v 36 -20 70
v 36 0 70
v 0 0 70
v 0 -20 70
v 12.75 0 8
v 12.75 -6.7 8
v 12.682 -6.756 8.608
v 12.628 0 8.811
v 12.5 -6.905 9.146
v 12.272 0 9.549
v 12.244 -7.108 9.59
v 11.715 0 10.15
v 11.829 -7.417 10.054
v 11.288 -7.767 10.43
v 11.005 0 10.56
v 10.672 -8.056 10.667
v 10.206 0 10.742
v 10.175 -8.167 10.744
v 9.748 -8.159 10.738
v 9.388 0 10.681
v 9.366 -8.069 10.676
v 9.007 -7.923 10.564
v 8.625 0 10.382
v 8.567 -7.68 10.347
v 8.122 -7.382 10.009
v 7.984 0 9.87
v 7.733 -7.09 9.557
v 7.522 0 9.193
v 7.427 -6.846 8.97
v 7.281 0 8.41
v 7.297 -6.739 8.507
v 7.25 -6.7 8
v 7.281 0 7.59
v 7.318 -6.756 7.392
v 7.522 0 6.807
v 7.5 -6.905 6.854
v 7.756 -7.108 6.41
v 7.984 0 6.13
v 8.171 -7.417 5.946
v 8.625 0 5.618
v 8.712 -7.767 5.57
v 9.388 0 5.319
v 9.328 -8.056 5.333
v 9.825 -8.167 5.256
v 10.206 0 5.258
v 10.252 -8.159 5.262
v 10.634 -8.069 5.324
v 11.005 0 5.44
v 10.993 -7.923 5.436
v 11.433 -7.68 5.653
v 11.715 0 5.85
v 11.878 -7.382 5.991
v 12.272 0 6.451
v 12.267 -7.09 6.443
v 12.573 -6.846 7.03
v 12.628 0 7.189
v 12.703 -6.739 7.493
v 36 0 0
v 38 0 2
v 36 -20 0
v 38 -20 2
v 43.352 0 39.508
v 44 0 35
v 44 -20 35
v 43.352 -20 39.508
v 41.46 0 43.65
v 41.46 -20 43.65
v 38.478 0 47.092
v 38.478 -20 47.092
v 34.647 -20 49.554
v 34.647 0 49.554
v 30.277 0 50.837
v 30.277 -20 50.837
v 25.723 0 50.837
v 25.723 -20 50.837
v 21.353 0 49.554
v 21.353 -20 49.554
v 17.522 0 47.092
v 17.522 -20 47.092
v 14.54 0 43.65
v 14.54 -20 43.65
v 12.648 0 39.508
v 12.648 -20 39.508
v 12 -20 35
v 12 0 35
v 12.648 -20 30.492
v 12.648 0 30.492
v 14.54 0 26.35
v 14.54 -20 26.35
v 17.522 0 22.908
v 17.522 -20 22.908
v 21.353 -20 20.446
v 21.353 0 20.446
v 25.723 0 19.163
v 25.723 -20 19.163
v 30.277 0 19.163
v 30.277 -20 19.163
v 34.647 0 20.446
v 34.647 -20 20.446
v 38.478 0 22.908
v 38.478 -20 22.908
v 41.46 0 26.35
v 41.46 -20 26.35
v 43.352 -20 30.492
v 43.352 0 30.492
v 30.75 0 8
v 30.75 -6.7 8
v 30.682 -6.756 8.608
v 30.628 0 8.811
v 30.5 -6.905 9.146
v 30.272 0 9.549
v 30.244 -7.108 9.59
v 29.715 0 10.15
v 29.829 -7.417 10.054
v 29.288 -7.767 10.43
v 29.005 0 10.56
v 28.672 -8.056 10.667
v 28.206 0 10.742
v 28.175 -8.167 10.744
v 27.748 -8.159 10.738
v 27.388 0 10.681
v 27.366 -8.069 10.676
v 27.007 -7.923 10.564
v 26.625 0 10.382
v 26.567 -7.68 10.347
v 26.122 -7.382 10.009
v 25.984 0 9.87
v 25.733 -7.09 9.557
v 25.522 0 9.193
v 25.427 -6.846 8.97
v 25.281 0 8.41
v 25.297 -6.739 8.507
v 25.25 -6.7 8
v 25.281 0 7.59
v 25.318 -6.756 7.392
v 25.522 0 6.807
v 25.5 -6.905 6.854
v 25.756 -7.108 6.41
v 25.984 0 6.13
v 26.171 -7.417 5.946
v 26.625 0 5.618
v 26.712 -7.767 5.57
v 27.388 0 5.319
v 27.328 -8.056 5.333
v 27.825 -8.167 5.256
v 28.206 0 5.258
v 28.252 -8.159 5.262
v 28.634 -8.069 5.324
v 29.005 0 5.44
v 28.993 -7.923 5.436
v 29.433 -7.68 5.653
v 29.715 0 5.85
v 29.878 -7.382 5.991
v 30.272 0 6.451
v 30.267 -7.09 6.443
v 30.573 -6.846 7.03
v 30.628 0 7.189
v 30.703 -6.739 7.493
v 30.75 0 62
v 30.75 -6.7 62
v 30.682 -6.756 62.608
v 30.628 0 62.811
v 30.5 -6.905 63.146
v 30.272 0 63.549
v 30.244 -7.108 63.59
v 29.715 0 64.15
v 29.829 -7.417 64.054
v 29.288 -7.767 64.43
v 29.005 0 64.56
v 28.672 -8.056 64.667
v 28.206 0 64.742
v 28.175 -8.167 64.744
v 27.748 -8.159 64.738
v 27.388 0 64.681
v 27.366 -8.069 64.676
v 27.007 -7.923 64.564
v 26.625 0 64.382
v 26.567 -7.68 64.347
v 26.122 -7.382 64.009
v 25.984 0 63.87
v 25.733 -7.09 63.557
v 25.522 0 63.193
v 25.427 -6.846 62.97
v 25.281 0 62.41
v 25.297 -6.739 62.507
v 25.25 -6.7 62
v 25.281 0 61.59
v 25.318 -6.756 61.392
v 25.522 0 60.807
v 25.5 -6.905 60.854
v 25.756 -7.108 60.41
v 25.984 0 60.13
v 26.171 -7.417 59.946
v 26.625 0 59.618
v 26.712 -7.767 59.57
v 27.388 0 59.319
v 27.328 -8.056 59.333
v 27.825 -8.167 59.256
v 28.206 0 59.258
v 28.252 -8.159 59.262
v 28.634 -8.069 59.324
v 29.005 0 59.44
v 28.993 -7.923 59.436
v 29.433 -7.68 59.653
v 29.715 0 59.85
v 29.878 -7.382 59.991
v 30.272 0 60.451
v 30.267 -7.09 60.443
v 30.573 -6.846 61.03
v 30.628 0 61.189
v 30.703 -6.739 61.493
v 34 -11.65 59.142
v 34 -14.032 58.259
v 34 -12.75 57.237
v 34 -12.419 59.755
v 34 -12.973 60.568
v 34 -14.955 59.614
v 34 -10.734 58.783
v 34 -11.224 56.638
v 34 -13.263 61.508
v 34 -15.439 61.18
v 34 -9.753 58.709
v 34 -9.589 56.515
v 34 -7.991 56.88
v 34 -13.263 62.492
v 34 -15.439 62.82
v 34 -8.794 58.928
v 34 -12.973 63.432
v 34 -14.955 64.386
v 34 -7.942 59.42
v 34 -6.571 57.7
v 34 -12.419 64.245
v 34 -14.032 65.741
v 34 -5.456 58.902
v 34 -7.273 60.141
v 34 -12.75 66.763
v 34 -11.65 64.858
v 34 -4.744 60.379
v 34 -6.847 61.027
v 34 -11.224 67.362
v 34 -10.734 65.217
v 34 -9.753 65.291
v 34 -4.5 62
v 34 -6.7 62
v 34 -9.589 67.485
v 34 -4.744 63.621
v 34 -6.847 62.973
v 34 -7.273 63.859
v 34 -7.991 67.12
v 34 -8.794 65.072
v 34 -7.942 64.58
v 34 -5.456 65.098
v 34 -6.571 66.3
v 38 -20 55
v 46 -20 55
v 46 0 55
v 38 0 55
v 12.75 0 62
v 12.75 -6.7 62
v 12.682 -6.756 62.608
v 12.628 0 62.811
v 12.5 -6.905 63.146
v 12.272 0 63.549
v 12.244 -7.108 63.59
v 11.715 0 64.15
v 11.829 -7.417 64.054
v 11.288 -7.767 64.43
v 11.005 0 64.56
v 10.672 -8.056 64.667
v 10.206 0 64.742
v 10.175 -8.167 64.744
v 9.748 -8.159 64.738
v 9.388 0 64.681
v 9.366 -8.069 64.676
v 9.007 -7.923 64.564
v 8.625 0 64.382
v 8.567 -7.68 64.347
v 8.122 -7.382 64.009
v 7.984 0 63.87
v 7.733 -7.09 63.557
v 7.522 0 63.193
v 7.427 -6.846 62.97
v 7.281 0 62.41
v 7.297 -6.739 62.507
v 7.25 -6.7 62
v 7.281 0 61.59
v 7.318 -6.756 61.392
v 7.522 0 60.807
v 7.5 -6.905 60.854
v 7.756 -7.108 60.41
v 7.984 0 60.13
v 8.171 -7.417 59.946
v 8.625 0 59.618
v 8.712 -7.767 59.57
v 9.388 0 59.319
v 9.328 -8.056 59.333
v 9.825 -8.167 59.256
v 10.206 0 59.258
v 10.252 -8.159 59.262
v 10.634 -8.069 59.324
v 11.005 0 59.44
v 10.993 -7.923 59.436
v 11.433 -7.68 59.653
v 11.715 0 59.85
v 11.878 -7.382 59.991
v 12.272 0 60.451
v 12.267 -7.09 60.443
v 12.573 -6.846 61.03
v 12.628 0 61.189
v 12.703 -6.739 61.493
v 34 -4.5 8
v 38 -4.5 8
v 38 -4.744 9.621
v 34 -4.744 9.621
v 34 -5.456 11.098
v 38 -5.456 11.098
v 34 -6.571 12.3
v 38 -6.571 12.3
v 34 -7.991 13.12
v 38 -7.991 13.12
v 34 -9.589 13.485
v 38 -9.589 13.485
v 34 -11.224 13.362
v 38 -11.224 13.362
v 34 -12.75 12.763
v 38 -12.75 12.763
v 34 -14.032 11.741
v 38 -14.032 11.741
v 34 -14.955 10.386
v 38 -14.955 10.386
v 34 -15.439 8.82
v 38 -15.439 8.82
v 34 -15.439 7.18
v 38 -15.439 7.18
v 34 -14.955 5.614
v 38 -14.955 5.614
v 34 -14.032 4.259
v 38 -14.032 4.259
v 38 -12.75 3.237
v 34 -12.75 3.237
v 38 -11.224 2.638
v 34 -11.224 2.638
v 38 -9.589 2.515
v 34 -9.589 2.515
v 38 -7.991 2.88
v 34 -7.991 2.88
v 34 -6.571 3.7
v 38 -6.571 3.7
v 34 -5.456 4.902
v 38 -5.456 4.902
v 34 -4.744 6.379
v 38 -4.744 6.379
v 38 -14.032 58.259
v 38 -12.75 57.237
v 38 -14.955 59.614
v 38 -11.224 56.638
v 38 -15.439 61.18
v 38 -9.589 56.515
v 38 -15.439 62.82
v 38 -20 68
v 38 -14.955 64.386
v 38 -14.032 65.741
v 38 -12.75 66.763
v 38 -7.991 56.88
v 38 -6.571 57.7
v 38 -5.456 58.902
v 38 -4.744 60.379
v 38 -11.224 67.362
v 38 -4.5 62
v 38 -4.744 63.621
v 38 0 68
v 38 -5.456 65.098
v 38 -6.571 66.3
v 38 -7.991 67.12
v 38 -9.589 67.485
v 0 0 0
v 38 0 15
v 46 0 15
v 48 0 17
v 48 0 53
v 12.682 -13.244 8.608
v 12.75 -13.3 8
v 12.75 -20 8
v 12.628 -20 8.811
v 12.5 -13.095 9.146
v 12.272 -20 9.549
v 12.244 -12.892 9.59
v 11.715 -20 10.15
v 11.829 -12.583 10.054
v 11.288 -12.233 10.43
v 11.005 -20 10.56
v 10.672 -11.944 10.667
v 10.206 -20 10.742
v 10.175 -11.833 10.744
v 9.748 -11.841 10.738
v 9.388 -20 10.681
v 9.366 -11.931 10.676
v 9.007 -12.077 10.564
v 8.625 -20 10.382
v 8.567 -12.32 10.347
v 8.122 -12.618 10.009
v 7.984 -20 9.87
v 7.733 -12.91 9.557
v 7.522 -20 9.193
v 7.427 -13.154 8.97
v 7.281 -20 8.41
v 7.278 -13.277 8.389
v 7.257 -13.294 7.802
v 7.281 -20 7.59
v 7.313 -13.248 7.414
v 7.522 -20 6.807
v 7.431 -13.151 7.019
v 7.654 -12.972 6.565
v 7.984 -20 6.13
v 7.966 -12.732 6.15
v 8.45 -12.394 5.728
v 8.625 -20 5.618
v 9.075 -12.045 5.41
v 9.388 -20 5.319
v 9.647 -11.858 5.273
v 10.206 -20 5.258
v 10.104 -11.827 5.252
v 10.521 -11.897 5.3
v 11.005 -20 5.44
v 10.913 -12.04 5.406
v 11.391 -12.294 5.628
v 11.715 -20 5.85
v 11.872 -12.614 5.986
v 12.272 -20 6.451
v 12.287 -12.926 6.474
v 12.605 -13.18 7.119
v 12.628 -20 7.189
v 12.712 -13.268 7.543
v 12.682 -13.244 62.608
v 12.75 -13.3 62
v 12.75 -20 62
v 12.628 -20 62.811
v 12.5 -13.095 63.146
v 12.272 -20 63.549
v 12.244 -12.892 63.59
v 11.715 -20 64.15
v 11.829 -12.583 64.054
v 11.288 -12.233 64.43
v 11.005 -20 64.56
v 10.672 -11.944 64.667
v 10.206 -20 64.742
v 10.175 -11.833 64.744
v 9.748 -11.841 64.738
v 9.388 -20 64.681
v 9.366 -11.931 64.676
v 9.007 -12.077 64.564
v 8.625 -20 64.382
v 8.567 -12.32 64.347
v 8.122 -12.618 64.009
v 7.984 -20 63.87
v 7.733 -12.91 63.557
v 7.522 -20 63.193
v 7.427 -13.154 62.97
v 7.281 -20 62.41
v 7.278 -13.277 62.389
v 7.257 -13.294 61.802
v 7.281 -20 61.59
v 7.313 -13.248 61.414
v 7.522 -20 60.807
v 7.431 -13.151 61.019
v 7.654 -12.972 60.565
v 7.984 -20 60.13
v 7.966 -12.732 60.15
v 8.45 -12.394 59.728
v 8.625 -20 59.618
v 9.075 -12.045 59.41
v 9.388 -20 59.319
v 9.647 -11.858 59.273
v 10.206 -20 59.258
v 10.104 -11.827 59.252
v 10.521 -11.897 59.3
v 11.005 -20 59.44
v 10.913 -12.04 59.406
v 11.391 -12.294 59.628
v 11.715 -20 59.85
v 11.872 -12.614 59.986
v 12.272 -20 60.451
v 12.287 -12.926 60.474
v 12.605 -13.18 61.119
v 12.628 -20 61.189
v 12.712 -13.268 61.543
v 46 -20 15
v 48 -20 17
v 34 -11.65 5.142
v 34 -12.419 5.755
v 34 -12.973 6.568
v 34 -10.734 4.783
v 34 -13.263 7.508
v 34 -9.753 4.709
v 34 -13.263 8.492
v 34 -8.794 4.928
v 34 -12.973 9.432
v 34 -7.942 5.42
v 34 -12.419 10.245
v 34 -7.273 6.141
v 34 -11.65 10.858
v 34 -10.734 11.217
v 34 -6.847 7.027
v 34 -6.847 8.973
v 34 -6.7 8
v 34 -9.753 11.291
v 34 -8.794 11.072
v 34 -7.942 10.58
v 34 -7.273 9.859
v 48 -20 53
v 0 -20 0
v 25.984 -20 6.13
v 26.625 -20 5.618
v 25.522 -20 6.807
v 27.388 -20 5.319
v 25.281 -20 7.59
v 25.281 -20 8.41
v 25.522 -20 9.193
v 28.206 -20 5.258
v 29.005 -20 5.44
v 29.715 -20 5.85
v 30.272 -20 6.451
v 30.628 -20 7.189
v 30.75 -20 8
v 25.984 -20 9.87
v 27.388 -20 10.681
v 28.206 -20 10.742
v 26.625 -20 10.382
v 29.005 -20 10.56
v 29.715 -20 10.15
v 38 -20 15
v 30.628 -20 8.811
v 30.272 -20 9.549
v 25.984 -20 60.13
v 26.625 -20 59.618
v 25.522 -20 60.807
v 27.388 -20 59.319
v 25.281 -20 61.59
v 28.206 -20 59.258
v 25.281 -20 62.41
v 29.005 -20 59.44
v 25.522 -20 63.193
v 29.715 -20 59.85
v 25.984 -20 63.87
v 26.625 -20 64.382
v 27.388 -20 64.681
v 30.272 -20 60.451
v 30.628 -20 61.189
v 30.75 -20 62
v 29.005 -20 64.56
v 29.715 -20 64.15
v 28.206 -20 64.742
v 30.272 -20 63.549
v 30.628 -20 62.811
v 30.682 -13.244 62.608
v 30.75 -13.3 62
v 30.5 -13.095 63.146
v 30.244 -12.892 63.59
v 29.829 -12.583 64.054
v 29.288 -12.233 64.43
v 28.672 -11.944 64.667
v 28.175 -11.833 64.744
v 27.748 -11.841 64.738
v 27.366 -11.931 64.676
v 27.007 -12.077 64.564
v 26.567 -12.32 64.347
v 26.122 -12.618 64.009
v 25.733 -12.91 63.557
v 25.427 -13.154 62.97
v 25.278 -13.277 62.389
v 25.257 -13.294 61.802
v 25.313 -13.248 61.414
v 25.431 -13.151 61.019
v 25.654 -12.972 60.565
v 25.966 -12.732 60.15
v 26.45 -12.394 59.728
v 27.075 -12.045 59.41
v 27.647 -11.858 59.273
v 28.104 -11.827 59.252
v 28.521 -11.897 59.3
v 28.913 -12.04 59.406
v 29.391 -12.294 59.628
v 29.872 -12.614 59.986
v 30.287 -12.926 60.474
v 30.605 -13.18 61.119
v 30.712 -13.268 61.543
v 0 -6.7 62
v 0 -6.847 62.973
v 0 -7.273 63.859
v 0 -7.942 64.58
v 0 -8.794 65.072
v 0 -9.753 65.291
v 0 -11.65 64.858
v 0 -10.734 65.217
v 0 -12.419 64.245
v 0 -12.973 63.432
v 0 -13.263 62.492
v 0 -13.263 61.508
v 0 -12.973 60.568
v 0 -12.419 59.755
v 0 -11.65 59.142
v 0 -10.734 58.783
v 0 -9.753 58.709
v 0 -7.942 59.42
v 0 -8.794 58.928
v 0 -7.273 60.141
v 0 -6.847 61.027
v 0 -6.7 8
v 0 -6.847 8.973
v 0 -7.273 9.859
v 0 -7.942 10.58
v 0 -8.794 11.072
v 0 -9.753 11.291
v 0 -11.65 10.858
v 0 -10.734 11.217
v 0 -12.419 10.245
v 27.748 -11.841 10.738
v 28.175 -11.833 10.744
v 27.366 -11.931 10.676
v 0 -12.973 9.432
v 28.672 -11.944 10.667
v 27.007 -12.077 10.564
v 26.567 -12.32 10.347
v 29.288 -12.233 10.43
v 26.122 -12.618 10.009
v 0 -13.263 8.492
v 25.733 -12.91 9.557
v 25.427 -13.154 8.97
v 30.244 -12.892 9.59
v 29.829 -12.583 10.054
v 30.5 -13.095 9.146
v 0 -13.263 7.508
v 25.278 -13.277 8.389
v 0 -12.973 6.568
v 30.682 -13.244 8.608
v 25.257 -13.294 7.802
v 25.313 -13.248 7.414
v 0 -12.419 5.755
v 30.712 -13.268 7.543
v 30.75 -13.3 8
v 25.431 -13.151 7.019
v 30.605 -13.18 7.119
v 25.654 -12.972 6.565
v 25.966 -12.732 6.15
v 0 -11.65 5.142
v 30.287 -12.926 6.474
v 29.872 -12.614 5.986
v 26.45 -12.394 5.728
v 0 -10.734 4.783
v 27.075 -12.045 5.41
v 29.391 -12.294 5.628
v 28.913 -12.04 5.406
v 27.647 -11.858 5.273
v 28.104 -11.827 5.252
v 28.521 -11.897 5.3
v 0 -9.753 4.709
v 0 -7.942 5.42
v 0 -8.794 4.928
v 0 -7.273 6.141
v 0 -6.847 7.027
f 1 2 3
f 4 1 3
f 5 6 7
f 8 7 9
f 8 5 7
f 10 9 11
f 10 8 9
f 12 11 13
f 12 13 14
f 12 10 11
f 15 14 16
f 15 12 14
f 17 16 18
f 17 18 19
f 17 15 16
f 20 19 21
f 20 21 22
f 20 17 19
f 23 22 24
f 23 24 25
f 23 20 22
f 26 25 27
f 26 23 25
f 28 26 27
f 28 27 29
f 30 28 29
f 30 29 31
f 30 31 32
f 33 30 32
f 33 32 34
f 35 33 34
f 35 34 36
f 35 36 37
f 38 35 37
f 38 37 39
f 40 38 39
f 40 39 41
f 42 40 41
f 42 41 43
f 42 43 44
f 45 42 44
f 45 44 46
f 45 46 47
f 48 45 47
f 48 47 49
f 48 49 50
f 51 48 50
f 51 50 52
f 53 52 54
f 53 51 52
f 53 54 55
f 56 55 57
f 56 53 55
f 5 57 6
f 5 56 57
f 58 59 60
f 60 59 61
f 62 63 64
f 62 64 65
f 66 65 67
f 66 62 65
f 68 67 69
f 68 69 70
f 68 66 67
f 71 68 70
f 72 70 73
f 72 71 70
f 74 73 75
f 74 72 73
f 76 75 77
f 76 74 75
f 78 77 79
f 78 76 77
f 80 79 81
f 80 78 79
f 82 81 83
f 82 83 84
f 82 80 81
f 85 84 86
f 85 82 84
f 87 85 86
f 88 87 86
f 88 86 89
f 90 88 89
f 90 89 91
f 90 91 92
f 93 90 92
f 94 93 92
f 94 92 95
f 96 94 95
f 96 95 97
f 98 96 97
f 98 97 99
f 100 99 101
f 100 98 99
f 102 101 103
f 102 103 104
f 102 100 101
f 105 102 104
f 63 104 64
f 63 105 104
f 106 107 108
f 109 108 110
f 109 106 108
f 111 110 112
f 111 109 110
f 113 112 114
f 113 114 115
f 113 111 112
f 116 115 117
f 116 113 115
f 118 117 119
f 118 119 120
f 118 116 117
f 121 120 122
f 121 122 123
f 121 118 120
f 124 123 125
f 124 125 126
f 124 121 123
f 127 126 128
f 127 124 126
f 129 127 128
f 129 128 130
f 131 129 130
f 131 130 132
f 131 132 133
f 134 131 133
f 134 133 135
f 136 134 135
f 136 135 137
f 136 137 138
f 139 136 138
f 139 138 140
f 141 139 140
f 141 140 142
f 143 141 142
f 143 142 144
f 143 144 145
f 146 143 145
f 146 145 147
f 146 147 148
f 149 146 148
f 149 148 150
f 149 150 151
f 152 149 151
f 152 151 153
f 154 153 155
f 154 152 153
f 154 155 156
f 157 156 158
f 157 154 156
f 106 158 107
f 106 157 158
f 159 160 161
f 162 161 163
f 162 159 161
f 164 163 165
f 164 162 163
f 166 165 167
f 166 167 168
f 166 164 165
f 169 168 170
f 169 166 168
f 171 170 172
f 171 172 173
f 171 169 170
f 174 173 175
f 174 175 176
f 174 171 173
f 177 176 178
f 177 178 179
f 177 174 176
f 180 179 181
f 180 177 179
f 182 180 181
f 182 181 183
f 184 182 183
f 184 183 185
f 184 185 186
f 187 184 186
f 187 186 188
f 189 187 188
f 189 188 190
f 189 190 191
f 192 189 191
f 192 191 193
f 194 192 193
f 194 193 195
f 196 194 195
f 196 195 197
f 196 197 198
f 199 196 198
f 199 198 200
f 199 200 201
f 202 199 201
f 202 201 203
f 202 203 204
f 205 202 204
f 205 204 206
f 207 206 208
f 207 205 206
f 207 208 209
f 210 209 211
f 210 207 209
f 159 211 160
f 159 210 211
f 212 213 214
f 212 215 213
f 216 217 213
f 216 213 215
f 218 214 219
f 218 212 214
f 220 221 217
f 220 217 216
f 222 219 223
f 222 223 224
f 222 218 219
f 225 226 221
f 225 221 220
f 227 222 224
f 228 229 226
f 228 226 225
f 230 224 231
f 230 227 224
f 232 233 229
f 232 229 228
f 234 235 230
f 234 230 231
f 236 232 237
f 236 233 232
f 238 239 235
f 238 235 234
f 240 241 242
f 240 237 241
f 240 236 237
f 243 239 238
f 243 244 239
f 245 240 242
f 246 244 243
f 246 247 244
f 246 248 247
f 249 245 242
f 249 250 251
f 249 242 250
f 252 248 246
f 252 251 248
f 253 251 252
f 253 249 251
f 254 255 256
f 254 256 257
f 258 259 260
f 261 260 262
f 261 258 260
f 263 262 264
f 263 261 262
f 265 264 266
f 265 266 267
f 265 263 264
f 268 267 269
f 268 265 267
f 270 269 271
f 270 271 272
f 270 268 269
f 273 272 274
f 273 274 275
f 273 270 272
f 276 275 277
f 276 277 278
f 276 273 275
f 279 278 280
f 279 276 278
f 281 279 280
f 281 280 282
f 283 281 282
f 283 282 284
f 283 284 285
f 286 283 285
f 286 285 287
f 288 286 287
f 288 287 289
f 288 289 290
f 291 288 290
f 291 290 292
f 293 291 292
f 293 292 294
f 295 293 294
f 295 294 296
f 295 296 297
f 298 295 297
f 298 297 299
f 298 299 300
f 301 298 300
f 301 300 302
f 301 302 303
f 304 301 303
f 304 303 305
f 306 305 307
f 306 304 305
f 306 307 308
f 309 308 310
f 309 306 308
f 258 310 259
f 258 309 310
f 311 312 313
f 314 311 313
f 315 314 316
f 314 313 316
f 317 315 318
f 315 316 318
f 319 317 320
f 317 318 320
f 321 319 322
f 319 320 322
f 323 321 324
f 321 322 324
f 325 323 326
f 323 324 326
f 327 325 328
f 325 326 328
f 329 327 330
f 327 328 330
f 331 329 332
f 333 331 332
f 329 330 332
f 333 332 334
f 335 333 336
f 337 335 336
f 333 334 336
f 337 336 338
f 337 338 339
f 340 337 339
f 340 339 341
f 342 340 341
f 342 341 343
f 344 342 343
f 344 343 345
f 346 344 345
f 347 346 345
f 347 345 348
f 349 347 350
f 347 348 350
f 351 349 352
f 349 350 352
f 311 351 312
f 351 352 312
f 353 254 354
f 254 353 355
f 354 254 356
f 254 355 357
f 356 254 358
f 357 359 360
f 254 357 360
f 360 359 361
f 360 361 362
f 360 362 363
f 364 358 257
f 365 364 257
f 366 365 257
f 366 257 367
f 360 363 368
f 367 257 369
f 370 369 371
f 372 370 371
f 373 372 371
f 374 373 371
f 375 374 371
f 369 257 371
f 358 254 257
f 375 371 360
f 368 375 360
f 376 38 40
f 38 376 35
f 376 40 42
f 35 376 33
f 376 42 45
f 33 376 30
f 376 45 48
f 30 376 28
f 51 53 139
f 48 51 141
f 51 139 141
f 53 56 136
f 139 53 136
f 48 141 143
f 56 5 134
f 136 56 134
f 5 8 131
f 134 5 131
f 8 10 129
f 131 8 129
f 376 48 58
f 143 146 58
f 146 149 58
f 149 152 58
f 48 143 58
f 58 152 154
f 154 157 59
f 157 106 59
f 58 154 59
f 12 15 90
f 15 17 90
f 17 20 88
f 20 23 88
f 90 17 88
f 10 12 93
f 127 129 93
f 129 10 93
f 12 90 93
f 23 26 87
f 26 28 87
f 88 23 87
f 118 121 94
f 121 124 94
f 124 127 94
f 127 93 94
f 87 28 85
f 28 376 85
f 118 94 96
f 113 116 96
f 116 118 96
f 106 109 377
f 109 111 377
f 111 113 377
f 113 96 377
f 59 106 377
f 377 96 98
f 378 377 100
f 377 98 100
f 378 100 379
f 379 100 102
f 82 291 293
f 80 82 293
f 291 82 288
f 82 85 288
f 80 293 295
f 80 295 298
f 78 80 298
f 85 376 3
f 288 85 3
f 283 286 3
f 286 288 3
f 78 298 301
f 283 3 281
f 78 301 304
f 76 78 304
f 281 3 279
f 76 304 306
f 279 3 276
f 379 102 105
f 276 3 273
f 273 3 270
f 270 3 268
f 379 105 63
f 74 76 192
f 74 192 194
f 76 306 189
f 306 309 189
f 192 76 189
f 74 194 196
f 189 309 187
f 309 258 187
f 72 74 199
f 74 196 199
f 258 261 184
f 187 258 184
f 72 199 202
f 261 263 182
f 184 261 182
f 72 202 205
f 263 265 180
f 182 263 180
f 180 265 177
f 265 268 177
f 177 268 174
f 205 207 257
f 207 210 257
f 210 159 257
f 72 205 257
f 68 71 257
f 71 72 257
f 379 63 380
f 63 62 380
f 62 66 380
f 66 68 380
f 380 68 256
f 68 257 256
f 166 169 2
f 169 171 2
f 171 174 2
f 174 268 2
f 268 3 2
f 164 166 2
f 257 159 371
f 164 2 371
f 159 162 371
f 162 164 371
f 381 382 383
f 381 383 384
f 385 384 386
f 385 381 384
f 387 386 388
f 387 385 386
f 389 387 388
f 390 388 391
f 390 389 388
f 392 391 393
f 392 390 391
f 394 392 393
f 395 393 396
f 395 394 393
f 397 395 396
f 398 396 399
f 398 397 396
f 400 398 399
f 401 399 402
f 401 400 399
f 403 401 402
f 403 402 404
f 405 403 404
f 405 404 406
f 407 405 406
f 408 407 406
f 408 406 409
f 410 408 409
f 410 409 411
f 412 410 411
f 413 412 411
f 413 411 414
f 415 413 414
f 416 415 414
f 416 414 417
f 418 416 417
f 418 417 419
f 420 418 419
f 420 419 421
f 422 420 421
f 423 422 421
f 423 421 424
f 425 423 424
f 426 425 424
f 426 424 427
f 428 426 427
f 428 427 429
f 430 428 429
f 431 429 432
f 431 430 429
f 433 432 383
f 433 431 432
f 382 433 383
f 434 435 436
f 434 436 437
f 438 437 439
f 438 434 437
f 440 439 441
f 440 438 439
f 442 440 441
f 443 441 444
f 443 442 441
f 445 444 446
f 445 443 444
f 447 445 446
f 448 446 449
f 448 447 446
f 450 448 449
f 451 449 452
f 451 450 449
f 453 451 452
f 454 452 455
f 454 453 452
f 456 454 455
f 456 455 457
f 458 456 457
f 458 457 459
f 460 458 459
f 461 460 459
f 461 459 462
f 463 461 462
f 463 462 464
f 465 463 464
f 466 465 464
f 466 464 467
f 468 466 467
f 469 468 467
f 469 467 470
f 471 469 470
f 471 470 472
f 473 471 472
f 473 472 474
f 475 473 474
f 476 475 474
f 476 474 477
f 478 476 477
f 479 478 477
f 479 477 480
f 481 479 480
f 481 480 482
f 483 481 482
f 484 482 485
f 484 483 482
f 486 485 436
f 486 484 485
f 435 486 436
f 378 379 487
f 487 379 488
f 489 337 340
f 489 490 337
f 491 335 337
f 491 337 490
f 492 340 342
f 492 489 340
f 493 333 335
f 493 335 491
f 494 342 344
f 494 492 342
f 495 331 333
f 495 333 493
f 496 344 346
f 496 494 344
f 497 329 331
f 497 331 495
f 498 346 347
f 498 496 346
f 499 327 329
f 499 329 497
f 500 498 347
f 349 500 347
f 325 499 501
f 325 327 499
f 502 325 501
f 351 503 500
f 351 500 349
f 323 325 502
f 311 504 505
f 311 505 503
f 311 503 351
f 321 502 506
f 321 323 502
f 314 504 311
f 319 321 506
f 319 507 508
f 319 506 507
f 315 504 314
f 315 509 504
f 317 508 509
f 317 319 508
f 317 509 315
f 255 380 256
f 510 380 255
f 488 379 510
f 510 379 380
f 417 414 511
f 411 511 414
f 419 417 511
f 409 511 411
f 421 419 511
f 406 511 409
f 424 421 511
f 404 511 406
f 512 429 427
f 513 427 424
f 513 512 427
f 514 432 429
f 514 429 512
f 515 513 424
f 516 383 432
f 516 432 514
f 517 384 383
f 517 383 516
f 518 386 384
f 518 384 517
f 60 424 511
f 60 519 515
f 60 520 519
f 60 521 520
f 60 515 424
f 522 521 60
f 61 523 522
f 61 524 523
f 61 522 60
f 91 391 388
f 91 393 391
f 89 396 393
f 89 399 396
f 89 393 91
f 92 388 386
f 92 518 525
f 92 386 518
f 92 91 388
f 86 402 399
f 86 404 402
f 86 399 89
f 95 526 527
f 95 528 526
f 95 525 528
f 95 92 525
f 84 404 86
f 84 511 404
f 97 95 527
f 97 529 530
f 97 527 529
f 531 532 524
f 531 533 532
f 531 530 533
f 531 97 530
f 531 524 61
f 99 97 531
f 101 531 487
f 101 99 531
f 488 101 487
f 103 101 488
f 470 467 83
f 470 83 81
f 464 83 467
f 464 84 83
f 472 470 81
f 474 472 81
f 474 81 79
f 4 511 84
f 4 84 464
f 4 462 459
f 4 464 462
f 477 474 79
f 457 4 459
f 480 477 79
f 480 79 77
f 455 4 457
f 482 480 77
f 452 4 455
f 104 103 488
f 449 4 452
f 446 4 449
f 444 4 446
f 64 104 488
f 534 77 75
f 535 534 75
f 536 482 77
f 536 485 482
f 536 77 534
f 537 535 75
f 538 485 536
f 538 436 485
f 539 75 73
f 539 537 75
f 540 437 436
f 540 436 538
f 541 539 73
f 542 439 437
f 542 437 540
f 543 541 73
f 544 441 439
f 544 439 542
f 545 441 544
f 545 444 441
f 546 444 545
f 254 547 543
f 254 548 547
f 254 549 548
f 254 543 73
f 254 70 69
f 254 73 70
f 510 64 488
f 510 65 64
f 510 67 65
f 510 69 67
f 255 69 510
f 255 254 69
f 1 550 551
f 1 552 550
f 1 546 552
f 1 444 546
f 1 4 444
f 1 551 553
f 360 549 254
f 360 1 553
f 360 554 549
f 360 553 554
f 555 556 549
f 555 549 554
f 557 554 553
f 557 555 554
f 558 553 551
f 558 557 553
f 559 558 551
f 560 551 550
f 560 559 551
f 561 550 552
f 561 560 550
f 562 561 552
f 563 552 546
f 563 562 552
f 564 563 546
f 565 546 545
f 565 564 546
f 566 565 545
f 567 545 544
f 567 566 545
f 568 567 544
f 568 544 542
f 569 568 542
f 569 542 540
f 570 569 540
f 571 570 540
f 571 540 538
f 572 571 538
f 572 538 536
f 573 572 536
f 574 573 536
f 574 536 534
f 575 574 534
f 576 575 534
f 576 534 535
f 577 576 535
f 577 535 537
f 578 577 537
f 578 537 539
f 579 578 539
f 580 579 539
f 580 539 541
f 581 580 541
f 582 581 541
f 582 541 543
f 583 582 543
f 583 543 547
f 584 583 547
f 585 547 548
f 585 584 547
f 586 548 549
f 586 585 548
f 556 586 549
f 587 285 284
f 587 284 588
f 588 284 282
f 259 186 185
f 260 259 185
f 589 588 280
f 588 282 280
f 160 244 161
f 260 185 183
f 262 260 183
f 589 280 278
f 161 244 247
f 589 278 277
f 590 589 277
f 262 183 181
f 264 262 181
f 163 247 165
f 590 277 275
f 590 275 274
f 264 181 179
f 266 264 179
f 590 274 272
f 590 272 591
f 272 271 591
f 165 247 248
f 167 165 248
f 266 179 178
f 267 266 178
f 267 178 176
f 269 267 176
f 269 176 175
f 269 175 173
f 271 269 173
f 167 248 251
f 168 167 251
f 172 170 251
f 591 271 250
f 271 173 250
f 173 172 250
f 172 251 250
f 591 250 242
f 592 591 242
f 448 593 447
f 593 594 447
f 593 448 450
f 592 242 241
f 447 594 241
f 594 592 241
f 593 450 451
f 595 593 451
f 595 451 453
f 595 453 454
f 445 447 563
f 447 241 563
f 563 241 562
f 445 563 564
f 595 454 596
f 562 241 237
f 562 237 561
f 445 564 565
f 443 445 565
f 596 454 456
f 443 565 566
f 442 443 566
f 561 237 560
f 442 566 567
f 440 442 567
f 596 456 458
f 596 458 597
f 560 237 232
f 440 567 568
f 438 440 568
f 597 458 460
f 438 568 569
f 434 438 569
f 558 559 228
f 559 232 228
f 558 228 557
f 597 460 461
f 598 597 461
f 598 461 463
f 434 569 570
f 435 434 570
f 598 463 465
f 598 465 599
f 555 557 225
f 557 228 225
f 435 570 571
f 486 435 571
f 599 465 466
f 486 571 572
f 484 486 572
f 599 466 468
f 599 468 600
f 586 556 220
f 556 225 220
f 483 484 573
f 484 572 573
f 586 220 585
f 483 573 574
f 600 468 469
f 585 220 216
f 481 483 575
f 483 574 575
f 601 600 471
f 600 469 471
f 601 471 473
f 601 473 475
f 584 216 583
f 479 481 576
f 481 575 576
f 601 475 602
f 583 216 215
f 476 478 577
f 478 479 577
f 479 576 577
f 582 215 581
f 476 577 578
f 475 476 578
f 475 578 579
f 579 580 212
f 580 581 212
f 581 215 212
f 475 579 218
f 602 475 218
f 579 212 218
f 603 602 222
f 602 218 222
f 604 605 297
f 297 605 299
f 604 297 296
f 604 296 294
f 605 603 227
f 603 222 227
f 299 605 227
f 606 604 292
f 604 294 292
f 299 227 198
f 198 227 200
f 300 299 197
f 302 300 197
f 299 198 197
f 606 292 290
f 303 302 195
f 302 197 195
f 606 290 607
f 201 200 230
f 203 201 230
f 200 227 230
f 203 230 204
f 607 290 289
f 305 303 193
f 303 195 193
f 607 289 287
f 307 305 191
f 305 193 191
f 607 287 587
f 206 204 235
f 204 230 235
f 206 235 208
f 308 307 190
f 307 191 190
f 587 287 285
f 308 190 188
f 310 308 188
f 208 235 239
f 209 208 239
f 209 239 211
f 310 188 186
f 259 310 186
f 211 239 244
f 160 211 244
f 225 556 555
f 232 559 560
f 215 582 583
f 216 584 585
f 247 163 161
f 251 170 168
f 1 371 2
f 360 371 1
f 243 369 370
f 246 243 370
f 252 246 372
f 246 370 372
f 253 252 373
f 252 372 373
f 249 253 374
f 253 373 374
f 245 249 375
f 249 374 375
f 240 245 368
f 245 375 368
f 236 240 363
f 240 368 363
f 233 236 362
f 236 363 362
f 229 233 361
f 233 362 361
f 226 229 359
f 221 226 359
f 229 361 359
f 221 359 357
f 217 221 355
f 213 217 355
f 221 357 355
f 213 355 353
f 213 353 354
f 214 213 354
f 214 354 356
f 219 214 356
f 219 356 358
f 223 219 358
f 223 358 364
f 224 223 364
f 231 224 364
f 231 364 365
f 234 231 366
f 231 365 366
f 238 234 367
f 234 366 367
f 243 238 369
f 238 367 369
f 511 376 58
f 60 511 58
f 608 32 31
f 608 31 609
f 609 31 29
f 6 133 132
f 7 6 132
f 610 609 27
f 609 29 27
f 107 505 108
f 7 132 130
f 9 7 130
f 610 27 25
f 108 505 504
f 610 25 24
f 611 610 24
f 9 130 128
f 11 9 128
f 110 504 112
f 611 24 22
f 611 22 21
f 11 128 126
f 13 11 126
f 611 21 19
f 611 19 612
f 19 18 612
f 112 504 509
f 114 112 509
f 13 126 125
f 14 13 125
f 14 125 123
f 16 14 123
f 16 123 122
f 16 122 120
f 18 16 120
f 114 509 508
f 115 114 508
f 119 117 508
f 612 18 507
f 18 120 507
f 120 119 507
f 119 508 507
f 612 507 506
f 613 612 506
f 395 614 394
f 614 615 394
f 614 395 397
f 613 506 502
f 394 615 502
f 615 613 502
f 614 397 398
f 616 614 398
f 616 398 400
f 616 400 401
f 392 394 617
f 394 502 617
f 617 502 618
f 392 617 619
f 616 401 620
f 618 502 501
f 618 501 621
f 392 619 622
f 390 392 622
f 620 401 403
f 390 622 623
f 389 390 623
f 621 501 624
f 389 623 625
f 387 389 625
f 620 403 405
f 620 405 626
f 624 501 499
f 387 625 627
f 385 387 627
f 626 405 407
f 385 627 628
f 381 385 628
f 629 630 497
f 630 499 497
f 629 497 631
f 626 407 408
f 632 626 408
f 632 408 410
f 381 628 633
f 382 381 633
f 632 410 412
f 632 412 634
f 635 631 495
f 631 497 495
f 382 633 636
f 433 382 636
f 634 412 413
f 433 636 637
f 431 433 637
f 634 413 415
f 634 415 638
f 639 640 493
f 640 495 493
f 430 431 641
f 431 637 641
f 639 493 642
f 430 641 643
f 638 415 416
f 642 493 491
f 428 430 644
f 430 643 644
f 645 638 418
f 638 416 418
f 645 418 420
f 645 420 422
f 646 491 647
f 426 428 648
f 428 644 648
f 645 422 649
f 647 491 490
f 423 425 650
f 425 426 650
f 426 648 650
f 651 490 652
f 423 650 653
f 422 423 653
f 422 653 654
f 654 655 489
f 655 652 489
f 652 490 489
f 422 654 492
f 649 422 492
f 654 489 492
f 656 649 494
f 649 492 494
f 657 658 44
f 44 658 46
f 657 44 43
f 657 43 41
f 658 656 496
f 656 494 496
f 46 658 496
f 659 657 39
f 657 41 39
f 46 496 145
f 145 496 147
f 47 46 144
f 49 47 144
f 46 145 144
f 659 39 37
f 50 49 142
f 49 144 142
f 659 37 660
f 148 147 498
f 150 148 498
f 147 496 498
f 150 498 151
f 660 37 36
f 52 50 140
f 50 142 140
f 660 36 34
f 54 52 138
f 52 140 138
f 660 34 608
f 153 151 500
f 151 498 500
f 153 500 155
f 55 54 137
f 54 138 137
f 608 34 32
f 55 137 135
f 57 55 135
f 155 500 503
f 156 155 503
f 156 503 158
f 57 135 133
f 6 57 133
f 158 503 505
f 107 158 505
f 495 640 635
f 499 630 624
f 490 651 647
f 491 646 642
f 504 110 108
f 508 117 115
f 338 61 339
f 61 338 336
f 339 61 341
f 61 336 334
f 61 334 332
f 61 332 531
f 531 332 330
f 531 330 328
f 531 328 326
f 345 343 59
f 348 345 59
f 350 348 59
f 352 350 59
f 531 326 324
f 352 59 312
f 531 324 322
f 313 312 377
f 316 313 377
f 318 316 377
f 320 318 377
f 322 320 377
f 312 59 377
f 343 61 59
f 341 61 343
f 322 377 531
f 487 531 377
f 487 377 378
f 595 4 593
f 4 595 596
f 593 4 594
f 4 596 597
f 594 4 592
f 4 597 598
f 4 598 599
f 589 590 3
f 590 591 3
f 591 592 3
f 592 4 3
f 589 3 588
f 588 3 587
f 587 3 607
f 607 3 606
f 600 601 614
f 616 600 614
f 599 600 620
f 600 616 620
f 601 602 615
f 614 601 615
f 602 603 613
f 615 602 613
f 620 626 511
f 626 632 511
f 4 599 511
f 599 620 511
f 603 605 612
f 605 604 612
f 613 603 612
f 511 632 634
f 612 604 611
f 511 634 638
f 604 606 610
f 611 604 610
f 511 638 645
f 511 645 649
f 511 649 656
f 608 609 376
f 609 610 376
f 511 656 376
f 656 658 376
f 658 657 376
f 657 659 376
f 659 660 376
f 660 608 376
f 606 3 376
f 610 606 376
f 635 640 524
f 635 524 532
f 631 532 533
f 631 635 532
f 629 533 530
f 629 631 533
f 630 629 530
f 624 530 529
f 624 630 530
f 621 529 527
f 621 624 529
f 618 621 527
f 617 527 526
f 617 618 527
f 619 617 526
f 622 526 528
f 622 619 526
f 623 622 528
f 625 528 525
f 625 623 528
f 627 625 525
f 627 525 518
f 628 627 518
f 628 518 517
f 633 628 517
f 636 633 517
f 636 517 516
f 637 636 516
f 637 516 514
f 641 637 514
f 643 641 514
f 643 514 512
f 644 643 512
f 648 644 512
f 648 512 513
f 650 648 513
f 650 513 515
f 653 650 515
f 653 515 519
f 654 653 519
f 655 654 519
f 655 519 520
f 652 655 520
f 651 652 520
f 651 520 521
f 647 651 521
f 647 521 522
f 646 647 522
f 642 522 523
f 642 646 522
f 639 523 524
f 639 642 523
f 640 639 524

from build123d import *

# Parameters (mm, degrees)
F0_R     = 2.75
F0_R_2   = 16
F1_DEPTH = 20
F2_R     = 3.3
F3_DEPTH = 38
F4_R     = 5.5
F5_DEPTH = 4
F6_SIZE  = 2


with BuildPart() as f1:
    # F0 (on Front) → F1 (new body)
    with BuildSketch(Plane.XZ):
        Polygon((0, 70), (0, 0), (38, 0), (38, 15), (48, 15), (48, 55), (38, 55), (38, 70), align=None)
        with Locations((10, 8)):
            Circle(F0_R, mode=Mode.SUBTRACT)
        with Locations((28, 8)):
            Circle(F0_R, mode=Mode.SUBTRACT)
        with Locations((10, 62)):
            Circle(F0_R, mode=Mode.SUBTRACT)
        with Locations((28, 35)):
            Circle(F0_R_2, mode=Mode.SUBTRACT)
        with Locations((28, 62)):
            Circle(F0_R, mode=Mode.SUBTRACT)
    extrude(amount=F1_DEPTH)

    # F2 (on face) → F3 (cut)
    with BuildSketch(Plane.YZ.offset(38)):
        with Locations((-10, 62)):
            Circle(F2_R)
        with Locations((-10, 8)):
            Circle(F2_R)
    extrude(amount=-F3_DEPTH, mode=Mode.SUBTRACT)

    # F4 (on face) → F5 (cut)
    with BuildSketch(Plane.YZ.offset(38)):
        with Locations((-10, 62)):
            Circle(F4_R)
        with Locations((-10, 8)):
            Circle(F4_R)
    extrude(amount=-F5_DEPTH, mode=Mode.SUBTRACT)

    # F6
    f6_edges = [f1.edges().sort_by_distance(p)[0] for p in [
        (38, -10, 70),
        (48, -10, 55),
        (38, -10, 0),
        (48, -10, 15),
    ]]
    chamfer(f6_edges, length=F6_SIZE)


solid = f1.part
